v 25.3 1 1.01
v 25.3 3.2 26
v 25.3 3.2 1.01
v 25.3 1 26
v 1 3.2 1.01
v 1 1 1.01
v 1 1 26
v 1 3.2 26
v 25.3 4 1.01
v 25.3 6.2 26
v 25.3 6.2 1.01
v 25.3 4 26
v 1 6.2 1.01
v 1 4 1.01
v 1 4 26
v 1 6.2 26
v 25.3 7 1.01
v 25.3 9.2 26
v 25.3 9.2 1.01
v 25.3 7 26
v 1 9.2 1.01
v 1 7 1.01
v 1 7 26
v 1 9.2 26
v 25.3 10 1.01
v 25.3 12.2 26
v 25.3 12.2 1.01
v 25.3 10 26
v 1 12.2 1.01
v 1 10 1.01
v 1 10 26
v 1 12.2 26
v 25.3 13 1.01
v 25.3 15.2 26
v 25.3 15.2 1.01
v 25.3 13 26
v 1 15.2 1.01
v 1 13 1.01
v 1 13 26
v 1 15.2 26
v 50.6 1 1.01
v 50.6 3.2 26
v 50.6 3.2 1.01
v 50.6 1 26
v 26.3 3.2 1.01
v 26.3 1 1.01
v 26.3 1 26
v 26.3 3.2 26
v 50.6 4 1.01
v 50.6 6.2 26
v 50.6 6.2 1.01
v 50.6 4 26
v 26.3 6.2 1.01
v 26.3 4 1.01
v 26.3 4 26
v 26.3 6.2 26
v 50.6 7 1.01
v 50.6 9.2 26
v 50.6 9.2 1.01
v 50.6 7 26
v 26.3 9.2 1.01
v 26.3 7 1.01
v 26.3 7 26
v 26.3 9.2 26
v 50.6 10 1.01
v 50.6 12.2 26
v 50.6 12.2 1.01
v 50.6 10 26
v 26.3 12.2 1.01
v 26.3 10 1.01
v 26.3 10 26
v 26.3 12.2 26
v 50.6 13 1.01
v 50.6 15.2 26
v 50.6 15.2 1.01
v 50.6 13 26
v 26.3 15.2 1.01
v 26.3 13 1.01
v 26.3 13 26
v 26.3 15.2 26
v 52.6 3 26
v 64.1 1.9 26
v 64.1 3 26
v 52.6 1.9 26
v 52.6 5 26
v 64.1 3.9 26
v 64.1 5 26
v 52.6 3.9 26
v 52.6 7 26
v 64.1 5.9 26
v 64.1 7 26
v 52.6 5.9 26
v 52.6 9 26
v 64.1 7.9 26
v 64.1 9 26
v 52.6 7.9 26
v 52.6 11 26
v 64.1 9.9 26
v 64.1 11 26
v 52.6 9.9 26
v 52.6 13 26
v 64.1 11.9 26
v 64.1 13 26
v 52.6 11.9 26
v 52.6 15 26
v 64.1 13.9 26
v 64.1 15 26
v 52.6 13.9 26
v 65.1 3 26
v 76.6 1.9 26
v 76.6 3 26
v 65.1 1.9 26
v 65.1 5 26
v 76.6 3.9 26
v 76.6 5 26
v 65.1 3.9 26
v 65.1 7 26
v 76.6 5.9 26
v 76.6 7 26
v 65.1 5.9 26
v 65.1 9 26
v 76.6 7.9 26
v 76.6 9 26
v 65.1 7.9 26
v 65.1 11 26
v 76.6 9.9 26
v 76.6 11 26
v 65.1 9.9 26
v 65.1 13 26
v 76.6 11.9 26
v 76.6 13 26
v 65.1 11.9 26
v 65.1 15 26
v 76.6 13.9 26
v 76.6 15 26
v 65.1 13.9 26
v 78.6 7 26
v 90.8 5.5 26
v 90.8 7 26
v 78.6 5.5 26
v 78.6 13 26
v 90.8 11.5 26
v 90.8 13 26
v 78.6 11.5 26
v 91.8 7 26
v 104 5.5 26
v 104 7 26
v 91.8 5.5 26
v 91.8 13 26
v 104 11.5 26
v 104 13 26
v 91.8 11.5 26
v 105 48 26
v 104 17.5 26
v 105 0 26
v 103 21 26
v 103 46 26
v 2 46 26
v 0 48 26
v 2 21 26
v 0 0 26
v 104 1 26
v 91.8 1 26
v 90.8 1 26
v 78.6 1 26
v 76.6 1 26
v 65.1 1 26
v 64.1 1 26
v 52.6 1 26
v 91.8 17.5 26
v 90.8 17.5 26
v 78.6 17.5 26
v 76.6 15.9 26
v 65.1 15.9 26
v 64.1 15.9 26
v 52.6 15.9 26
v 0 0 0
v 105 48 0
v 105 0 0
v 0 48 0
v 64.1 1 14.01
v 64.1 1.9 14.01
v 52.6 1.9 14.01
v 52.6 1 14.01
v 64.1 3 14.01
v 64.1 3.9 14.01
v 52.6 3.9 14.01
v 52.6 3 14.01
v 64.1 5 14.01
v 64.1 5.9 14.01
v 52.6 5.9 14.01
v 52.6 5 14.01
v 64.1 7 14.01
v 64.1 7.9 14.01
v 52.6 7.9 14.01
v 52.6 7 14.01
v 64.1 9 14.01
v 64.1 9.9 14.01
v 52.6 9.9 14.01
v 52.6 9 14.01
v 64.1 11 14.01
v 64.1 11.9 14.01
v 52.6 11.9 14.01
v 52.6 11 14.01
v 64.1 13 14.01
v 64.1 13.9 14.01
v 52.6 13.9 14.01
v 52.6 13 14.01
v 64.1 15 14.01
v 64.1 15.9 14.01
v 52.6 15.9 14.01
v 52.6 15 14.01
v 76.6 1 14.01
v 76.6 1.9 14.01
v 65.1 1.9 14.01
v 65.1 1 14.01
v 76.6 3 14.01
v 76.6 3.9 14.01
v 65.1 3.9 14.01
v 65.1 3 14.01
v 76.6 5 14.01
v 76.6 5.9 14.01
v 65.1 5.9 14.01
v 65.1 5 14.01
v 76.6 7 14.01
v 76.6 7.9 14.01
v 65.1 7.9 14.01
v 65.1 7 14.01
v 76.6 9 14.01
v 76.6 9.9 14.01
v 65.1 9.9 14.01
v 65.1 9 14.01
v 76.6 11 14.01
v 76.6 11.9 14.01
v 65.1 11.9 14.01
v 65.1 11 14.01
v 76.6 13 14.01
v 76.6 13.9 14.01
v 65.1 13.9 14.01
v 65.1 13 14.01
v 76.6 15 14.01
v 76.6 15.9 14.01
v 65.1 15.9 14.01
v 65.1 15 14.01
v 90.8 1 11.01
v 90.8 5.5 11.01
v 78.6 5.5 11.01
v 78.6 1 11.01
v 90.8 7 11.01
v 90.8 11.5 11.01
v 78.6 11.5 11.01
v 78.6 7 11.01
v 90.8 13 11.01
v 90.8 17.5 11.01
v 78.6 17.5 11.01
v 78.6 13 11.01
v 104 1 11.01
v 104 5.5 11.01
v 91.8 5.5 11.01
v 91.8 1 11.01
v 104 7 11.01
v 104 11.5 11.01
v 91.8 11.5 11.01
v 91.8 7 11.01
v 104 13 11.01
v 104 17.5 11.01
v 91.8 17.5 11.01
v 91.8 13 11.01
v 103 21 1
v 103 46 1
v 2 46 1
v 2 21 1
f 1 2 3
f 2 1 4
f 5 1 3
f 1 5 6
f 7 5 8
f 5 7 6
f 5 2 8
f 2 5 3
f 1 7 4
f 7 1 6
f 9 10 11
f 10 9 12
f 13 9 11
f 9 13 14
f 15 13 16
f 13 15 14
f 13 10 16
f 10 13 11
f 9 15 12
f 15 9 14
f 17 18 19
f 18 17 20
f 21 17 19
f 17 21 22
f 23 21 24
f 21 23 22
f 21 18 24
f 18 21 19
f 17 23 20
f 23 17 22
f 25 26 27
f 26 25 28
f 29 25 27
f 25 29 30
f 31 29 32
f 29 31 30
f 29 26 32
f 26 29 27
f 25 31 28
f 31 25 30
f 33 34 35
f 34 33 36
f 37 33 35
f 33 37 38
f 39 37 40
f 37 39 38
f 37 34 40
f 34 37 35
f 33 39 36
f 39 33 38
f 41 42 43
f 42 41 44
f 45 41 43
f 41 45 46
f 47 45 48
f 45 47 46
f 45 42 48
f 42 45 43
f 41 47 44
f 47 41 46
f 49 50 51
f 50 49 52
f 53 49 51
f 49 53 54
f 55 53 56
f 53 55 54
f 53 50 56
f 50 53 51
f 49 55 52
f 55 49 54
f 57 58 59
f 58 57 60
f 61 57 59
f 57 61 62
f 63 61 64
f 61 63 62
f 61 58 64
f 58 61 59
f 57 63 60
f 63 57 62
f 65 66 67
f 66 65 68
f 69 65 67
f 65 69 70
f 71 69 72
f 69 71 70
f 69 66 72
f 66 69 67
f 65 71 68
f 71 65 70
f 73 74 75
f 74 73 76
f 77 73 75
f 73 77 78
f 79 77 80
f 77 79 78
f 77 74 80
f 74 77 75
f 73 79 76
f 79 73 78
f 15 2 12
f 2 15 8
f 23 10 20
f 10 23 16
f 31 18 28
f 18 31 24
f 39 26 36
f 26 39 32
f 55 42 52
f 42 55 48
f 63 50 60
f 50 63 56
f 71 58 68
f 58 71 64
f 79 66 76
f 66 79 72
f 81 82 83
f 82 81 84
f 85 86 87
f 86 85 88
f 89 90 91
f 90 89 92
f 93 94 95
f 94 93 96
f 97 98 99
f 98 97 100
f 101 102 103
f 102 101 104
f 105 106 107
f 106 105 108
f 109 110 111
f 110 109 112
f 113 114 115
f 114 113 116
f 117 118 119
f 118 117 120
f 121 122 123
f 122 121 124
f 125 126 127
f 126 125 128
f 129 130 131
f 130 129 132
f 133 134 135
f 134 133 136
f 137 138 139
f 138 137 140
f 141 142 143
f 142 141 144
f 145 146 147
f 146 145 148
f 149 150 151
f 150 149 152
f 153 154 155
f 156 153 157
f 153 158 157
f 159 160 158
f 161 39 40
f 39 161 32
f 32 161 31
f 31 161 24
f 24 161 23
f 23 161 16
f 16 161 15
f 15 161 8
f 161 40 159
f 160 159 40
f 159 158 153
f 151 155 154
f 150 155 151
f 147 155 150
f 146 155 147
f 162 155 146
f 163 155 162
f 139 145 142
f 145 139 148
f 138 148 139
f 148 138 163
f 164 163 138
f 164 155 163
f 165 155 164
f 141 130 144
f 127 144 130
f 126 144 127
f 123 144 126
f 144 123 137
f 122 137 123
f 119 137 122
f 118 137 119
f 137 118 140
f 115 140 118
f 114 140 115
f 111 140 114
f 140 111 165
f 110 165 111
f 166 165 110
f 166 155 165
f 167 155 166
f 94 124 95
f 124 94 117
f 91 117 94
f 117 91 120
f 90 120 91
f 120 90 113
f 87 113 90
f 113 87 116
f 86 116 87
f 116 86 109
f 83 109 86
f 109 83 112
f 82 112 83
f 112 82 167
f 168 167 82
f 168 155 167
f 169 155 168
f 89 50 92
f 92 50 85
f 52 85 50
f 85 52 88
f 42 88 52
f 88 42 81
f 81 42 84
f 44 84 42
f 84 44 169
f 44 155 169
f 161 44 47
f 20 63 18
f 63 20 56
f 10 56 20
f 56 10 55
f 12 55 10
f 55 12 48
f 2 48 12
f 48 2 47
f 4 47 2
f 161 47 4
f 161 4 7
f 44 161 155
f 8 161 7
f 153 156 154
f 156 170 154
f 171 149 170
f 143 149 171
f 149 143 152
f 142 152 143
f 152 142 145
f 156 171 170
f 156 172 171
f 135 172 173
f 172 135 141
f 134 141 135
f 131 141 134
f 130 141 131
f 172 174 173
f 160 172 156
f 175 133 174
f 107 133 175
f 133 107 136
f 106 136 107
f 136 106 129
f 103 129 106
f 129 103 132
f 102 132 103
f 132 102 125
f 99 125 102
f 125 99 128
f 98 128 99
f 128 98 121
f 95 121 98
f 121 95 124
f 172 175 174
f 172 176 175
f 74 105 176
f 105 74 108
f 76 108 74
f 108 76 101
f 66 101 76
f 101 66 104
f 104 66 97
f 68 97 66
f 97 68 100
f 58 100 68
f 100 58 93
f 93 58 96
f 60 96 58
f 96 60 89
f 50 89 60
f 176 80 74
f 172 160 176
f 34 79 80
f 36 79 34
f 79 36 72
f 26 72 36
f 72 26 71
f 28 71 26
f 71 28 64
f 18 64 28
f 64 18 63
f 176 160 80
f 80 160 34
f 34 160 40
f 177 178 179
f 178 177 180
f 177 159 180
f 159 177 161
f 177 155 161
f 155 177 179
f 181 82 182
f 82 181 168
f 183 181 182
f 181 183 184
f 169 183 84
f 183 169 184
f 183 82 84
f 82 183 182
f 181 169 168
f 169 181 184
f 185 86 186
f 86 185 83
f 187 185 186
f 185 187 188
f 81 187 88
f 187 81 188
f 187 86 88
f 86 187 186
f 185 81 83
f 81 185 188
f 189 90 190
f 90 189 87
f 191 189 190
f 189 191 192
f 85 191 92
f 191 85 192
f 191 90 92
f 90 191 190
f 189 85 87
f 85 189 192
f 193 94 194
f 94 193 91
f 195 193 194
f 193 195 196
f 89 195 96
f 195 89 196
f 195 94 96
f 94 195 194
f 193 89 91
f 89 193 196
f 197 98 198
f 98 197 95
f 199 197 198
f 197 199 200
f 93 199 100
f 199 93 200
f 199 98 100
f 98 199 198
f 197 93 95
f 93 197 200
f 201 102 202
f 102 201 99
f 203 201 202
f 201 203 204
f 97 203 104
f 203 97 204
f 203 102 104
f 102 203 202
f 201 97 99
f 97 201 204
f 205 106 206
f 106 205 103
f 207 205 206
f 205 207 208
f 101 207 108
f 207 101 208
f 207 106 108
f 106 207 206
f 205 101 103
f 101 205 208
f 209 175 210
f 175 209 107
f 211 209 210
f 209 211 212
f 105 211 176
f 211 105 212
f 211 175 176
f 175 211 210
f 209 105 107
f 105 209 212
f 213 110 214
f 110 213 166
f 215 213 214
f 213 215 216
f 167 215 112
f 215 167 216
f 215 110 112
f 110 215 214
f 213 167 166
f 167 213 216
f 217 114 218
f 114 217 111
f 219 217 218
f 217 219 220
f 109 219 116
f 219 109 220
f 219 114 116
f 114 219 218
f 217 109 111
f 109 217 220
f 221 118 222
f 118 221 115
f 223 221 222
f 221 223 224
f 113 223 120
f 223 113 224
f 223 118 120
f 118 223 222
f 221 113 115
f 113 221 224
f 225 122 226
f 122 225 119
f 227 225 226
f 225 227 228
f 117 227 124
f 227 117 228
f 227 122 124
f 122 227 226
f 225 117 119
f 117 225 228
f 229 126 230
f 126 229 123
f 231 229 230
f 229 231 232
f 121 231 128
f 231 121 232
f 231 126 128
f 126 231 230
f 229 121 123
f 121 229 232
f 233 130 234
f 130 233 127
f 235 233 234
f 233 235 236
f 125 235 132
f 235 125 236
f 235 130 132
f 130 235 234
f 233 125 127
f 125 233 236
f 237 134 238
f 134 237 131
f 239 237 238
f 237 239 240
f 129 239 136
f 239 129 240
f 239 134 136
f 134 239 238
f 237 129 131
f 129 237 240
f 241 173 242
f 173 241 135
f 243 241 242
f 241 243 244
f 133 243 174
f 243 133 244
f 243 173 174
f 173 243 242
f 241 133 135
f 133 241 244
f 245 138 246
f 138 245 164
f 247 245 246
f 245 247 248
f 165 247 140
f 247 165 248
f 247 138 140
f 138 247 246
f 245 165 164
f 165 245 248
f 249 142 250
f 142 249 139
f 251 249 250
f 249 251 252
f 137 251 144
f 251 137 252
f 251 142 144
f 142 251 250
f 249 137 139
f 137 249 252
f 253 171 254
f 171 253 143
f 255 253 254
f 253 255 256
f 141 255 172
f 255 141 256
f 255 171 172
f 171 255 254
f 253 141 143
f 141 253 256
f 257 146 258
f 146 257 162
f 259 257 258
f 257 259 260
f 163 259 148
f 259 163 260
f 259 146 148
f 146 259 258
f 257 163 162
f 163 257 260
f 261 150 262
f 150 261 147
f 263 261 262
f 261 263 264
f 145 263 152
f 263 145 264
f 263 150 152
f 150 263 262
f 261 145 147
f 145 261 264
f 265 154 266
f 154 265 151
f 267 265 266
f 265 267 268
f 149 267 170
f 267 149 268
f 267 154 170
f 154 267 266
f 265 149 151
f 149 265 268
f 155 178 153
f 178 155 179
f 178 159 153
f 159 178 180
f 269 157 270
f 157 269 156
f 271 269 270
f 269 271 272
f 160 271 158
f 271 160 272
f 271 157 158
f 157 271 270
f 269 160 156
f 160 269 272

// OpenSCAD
/*///////////////////////////////////////////////////////////////
              -     By Miguel Ángel Vílchez López     -
              -          http://matronica.eu          -
              -     OpenScad Parametric StorageBox    -
              -           GNU-GPLv3 License           -
/////////////////////////////////////////////////////////////////

02/12/2016 - Initial programing
06/12/2016 - Finish first version

////////////////////////////////// - Info - //////////////////////////////////

// Parametric StorageBox, you can configure the numbers of holes for storing ..
// USBs, SDs, uSDs & another big box.

// If you make any modification, please share it.

// Any comment or suggestion to mangel@matronica.eu

////////////////////////////////////////////////////////////////////


////////////////////////////////// - StorageBox parameters - //////////////////////////////////

/* [USB parameters] */

// - Número de USBs - USBs number
number_usbs = 6;//[0:20] 
// - Número de columnas del USBs - USBs columns number
number_columns_usbs = 2;//[1:5]

/* [SD parameters] */

// - Número de SDs - SDs number
number_sds = 10;//[0:20]
// - Número de columnas del SDs - SDs columns number
number_columns_sds = 2;//[1:5]

/* [uSD parameters] */

// - Número de uSDs - uSDs number
number_usds = 16;//[0:40]
// - Número de columnas del uSDs - uSDs columns number
number_columns_usds = 2;//[1:5]

/* [Order] */

// - Orden de los agujeros - Holes order ( remember to remove if you put 0 on any number )
order=["sd","usd","usb"];

/* [Multiuse hole parameters] */

// - Tamaño del Agujero multiuso( en mm ) - Multiuse hole height( in mm )
multiuse_hole_height = 10;
// - Dimensión de los márgenes del agujero multiuso( en mm ) - Dimension of margin for the multiuse hole( in mm )
margins_dimension = 2;

////////////////////////////////// - Calculations - //////////////////////////////////

// Get the length on the X axis
function getsdlenX() = 24.3*number_columns_sds+number_columns_sds+1;
function getusdlenX() = 11.5*number_columns_usds+number_columns_usds+1;
function getusblenX() = 12.2*number_columns_usbs+number_columns_usbs+1;

// Get the length on the Z axis
function getsdlenY() = (3*ceil(number_sds/number_columns_sds))+1;
function getusblenY() = (6*ceil(number_usbs/number_columns_usbs))+1;
function getusdlenY() = (2*ceil(number_usds/number_columns_usds))+1;

// Max length on the Z axis
function max_z() = ((number_sds > 0) ? 26 : ((number_usbs > 0) ? 16 : ((number_usds > 0) ? 13 : 0) ) );

// Max length on the Y axis
max_y = quicksort([getsdlenY(),getusblenY(),getusdlenY()])[0];

////////////////////////////////// - Function sort - //////////////////////////////////

// input : list of numbers
// output : sorted list of numbers
function quicksort(arr) = !(len(arr)>0) ? [] : let(
    pivot   = arr[floor(len(arr)/2)],
    lesser  = [ for (y = arr) if (y  < pivot) y ],
    equal   = [ for (y = arr) if (y == pivot) y ],
    greater = [ for (y = arr) if (y  > pivot) y ]
) concat(
    quicksort(greater), equal, quicksort(lesser)
);

////////////////////////////////// - Module generate multiuse hole - //////////////////////////////////

module hole()
{

};

////////////////////////////////// - Module generate SD hole - //////////////////////////////////

module sd(initial_x=0,initial_y=0,initial_z=0)
{

};

////////////////////////////////// - Module generate uSD hole - //////////////////////////////////

module usd(initial_x=0,initial_y=0,initial_z=0)
{

};

////////////////////////////////// - Module generate USB hole - //////////////////////////////////

module usb(initial_x=0,initial_y=0,initial_z=0)
{

};

////////////////////////////////// - Module build all - //////////////////////////////////

module build(pass=0,now_x=0)
{
    if (pass < len(order))
    {
        if (order[pass] == "sd")
        {
            // generate SDs
            initial_x = now_x;
            initial_y = 0;
            initial_z = max_z()-26;
//            sd(now_x,0,max_z()-26);
            // More than 0 SDs
            if (number_sds > 0)
            {
                // 1 Column
                if (number_columns_sds <= 1)
                {
                    difference()
                    {
                        translate ([initial_x,initial_y,initial_z])
                        cube([26.3,(3*number_sds)+1,26],false);
                        for (a = [0:1:(number_sds-1)]) 
                            translate ([1+initial_x,(a*3)+1+initial_y,1.01+initial_z]) 
                            cube([24.3,2.2,25],false);
                    }
                }
                // More columns
                else
                {
                    difference()
                    {
                        translate ([initial_x,initial_y,initial_z])
                        cube([(25.3*number_columns_sds)+1,(3*ceil(number_sds/number_columns_sds))+1,26],false);
                        for (col = [0:1:number_columns_sds-1])
                        {
                            // The rest
                            if (col != number_columns_sds-1)
                            {
                                for (a = [0:1:(ceil(number_sds/number_columns_sds)-1)]) 
                                {
                                    translate ([(25.3*col)+1+initial_x,(a*3)+1+initial_y,1.01+initial_z])
                                    cube([24.3,2.2,25],false);
                                }
                            }
                            else
                            {
                                for (a = [0:1:(ceil(number_sds/number_columns_sds)-(number_sds%number_columns_sds)-1)]) 
                                {
                                    translate ([(25.3*col)+1+initial_x,(a*3)+1+initial_y,1.01+initial_z]) 
                                    cube([24.3,2.2,25],false);
                                }
                            }
                        }
                    }
                }
            }
            
            // fill the rest on Z axis
            translate([now_x,getsdlenY(),0]) 
                cube([getsdlenX(),max_y-getsdlenY(),max_z()]);
            build(pass+1,now_x+getsdlenX());    // recursive pass on order vector
        }
        if (order[pass] == "usd")
        {
                        // generate uSDs
            initial_x = now_x;
            initial_y = 0;
            initial_z = max_z()-13;
//            usd(now_x,0,max_z()-13);
                if (number_usds > 0)
    {
        // 1 Column
        if (number_columns_usds <= 1)
        {
            difference()
            {
                translate ([initial_x,initial_y,initial_z])
                cube([13.5,(2*number_usds)+1,13],false);
                for (a = [0:1:(number_usds-1)]) 
                    translate ([1+initial_x,(a*2)+1+initial_y,1.01+initial_z]) 
                    cube([11.5,0.9,12],false);
            }
        }
         // More columns
        else
        {
            difference()
            {
                translate ([initial_x,initial_y,initial_z])
                cube([(12.5*number_columns_usds)+1,(2*ceil(number_usds/number_columns_usds))+1,13],false);
                for (col = [0:1:number_columns_usds-1])
                {
                    // The rest
                    if (col != number_columns_usds-1)
                    {
                        for (a = [0:1:(ceil(number_usds/number_columns_usds)-1)]) 
                        {
                            translate ([(12.5*col)+1+initial_x,(a*2)+1+initial_y,1.01+initial_z])
                            cube([11.5,0.9,12],false);
                        }
                    }
                    else
                    {
                        for (a = [0:1:(ceil(number_usds/number_columns_usds)-(number_usds%number_columns_usds)-1)]) 
                        {
                            translate ([(12.5*col)+1+initial_x,(a*2)+1+initial_y,1.01+initial_z]) 
                            cube([11.5,0.9,12],false);
                        }
                    }
                }
            }
        }
    }
            // fill the rest on Z axis
            translate ([now_x,0,0]) 
                cube([getusdlenX(),getusdlenY(),max_z()-13]);
            translate([now_x,getusdlenY(),0]) 
                cube([getusdlenX(),max_y-getusdlenY(),max_z()]);
            build(pass+1,now_x+getusdlenX());    // recursive pass on order vector
        }
        if (order[pass] == "usb")
        {
                        // generate USBs
            initial_x = now_x;
            initial_y = 0;
            initial_z = max_z()-16;
         //   usb(now_x,0,max_z()-16);
    if (number_usbs > 0)
    {
        // 1 Column
        if (number_columns_usbs <= 1)
        {
            difference()
            {
                translate ([initial_x,initial_y,initial_z])
                cube([14.2,(6*number_usbs)+1,16],false);
                for (a = [0:1:(number_usbs-1)]) 
                    translate ([1+initial_x,(a*6)+1+initial_y,1.01+initial_z]) 
                    cube([12.2,4.5,15],false);
            }
        }
         // More columns
        else
        {
            difference()
            {
                translate ([initial_x,initial_y,initial_z])
                cube([(13.2*number_columns_usbs)+1,(6*ceil(number_usbs/number_columns_usbs))+1,16],false);
                for (col = [0:1:number_columns_usbs-1])
                {
                    // The rest
                    if (col != number_columns_usbs-1)
                    {
                        for (a = [0:1:(ceil(number_usbs/number_columns_usbs)-1)]) 
                        {
                            translate ([(13.2*col)+1+initial_x,(a*6)+1+initial_y,1.01+initial_z])
                            cube([12.2,4.5,15],false);
                        }
                    }
                    else
                    {
                        for (a = [0:1:(ceil(number_usbs/number_columns_usbs)-(number_usbs%number_columns_usbs)-1)]) 
                        {
                            translate ([(13.2*col)+1+initial_x,(a*6)+1+initial_y,1.01+initial_z]) 
                            cube([12.2,4.5,15],false);
                        }
                    }
                }
            }
        }
    }
            // fill the rest on Z axis
            translate ([now_x,0,0]) 
                cube([getusblenX(),getusblenY(),max_z()-16]);
            translate([now_x,getusblenY(),0]) 
                cube([getusblenX(),max_y-getusblenY(),max_z()]);
            build(pass+1,now_x+getusblenX());    // recursive pass on order vector
        }
    }
    else
    {
    max_x = getsdlenX()+getusdlenX()+getusblenX();
    difference()
    {
        max_x = getsdlenX()+getusdlenX()+getusblenX();
        translate([0,max_y,0]) cube([max_x,max_y+multiuse_hole_height,max_z()]);
        translate([margins_dimension,max_y+margins_dimension,1]) cube([max_x-margins_dimension*2,max_y+multiuse_hole_height-margins_dimension*2,max_z()+0.01]);
    }
    }
};

////////////////////////////////// - Building - //////////////////////////////////

build(0,0);
